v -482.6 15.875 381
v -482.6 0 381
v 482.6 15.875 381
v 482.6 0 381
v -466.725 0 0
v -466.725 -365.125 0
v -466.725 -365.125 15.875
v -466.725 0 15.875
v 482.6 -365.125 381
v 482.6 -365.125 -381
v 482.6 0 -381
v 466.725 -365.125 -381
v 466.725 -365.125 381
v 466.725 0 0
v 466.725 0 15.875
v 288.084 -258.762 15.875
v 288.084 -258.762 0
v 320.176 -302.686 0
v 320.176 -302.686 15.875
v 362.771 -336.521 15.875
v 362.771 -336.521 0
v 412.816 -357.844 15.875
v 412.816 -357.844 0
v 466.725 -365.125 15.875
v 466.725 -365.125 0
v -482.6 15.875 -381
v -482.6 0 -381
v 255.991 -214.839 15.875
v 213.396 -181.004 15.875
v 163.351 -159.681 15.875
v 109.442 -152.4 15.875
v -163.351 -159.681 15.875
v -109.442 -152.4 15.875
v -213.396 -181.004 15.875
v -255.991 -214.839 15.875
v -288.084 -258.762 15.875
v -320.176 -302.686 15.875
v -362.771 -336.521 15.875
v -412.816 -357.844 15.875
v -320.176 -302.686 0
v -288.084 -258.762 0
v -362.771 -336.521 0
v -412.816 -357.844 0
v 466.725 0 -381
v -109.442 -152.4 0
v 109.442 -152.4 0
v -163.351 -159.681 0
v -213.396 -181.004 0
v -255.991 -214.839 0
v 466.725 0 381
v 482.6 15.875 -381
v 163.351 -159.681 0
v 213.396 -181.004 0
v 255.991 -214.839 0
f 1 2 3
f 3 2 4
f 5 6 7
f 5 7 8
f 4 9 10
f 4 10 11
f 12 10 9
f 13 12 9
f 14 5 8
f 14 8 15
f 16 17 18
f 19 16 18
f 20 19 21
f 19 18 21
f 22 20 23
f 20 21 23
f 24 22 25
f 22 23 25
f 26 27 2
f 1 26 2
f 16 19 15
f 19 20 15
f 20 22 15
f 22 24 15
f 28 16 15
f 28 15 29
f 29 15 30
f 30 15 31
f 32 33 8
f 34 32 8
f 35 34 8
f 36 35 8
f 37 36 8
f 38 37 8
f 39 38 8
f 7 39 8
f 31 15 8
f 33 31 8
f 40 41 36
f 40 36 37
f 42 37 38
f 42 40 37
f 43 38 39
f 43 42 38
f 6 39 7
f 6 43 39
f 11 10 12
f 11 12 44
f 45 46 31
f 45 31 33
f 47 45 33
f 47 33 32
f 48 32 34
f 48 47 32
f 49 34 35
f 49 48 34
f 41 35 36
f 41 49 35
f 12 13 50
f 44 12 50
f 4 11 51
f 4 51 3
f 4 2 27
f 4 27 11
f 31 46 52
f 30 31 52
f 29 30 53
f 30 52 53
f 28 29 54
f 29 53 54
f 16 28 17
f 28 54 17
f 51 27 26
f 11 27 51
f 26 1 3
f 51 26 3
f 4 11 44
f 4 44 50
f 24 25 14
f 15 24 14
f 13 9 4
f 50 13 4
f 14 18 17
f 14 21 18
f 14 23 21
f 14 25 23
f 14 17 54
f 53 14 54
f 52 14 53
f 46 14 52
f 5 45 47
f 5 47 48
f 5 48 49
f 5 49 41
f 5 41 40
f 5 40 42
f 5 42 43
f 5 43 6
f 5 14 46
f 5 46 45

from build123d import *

# Parameters (mm, degrees)
F0_W     = 965.2
F0_H     = 762
F1_DEPTH = 15.875
F2_W     = 365.125
F2_H     = 762
F3_DEPTH = 15.875
F5_DEPTH = 15.875


with BuildPart() as f1:
    # F0 (on Front) → F1 (new body)
    with BuildSketch(Plane.XZ):
        Rectangle(F0_W, F0_H)
    extrude(amount=-F1_DEPTH)


with BuildPart() as f3:
    # F2 (on face) → F3 (new body)
    with BuildSketch(Plane.YZ.offset(482.6)):
        with Locations((-182.5625, 0)):
            Rectangle(F2_W, F2_H)
    extrude(amount=-F3_DEPTH)


with BuildPart() as f5:
    # F4 (on Top) → F5 (new body)
    with BuildSketch(Plane.XY):
        with BuildLine():
            Line((466.725, -365.125), (466.725, 0))
            Line((466.725, 0), (0, 0))
            Line((0, 0), (0, -152.4))
            Line((0, -152.4), (109.4422626966, -152.4))
            ThreePointArc((109.4422626966, -152.4), (213.3962428994, -181.0038660222), (288.0836313483, -258.7625))
            ThreePointArc((288.0836313483, -258.7625), (362.7710197972, -336.5211339778), (466.725, -365.125))
        make_face()
    extrude(amount=F5_DEPTH)

    # F6: F5 across plane


with BuildPart() as f5_1:
    add(f5.part)
    add(f5.part.mirror(Plane.YZ))


solid = Compound([f1.part, f3.part, f5_1.part])
